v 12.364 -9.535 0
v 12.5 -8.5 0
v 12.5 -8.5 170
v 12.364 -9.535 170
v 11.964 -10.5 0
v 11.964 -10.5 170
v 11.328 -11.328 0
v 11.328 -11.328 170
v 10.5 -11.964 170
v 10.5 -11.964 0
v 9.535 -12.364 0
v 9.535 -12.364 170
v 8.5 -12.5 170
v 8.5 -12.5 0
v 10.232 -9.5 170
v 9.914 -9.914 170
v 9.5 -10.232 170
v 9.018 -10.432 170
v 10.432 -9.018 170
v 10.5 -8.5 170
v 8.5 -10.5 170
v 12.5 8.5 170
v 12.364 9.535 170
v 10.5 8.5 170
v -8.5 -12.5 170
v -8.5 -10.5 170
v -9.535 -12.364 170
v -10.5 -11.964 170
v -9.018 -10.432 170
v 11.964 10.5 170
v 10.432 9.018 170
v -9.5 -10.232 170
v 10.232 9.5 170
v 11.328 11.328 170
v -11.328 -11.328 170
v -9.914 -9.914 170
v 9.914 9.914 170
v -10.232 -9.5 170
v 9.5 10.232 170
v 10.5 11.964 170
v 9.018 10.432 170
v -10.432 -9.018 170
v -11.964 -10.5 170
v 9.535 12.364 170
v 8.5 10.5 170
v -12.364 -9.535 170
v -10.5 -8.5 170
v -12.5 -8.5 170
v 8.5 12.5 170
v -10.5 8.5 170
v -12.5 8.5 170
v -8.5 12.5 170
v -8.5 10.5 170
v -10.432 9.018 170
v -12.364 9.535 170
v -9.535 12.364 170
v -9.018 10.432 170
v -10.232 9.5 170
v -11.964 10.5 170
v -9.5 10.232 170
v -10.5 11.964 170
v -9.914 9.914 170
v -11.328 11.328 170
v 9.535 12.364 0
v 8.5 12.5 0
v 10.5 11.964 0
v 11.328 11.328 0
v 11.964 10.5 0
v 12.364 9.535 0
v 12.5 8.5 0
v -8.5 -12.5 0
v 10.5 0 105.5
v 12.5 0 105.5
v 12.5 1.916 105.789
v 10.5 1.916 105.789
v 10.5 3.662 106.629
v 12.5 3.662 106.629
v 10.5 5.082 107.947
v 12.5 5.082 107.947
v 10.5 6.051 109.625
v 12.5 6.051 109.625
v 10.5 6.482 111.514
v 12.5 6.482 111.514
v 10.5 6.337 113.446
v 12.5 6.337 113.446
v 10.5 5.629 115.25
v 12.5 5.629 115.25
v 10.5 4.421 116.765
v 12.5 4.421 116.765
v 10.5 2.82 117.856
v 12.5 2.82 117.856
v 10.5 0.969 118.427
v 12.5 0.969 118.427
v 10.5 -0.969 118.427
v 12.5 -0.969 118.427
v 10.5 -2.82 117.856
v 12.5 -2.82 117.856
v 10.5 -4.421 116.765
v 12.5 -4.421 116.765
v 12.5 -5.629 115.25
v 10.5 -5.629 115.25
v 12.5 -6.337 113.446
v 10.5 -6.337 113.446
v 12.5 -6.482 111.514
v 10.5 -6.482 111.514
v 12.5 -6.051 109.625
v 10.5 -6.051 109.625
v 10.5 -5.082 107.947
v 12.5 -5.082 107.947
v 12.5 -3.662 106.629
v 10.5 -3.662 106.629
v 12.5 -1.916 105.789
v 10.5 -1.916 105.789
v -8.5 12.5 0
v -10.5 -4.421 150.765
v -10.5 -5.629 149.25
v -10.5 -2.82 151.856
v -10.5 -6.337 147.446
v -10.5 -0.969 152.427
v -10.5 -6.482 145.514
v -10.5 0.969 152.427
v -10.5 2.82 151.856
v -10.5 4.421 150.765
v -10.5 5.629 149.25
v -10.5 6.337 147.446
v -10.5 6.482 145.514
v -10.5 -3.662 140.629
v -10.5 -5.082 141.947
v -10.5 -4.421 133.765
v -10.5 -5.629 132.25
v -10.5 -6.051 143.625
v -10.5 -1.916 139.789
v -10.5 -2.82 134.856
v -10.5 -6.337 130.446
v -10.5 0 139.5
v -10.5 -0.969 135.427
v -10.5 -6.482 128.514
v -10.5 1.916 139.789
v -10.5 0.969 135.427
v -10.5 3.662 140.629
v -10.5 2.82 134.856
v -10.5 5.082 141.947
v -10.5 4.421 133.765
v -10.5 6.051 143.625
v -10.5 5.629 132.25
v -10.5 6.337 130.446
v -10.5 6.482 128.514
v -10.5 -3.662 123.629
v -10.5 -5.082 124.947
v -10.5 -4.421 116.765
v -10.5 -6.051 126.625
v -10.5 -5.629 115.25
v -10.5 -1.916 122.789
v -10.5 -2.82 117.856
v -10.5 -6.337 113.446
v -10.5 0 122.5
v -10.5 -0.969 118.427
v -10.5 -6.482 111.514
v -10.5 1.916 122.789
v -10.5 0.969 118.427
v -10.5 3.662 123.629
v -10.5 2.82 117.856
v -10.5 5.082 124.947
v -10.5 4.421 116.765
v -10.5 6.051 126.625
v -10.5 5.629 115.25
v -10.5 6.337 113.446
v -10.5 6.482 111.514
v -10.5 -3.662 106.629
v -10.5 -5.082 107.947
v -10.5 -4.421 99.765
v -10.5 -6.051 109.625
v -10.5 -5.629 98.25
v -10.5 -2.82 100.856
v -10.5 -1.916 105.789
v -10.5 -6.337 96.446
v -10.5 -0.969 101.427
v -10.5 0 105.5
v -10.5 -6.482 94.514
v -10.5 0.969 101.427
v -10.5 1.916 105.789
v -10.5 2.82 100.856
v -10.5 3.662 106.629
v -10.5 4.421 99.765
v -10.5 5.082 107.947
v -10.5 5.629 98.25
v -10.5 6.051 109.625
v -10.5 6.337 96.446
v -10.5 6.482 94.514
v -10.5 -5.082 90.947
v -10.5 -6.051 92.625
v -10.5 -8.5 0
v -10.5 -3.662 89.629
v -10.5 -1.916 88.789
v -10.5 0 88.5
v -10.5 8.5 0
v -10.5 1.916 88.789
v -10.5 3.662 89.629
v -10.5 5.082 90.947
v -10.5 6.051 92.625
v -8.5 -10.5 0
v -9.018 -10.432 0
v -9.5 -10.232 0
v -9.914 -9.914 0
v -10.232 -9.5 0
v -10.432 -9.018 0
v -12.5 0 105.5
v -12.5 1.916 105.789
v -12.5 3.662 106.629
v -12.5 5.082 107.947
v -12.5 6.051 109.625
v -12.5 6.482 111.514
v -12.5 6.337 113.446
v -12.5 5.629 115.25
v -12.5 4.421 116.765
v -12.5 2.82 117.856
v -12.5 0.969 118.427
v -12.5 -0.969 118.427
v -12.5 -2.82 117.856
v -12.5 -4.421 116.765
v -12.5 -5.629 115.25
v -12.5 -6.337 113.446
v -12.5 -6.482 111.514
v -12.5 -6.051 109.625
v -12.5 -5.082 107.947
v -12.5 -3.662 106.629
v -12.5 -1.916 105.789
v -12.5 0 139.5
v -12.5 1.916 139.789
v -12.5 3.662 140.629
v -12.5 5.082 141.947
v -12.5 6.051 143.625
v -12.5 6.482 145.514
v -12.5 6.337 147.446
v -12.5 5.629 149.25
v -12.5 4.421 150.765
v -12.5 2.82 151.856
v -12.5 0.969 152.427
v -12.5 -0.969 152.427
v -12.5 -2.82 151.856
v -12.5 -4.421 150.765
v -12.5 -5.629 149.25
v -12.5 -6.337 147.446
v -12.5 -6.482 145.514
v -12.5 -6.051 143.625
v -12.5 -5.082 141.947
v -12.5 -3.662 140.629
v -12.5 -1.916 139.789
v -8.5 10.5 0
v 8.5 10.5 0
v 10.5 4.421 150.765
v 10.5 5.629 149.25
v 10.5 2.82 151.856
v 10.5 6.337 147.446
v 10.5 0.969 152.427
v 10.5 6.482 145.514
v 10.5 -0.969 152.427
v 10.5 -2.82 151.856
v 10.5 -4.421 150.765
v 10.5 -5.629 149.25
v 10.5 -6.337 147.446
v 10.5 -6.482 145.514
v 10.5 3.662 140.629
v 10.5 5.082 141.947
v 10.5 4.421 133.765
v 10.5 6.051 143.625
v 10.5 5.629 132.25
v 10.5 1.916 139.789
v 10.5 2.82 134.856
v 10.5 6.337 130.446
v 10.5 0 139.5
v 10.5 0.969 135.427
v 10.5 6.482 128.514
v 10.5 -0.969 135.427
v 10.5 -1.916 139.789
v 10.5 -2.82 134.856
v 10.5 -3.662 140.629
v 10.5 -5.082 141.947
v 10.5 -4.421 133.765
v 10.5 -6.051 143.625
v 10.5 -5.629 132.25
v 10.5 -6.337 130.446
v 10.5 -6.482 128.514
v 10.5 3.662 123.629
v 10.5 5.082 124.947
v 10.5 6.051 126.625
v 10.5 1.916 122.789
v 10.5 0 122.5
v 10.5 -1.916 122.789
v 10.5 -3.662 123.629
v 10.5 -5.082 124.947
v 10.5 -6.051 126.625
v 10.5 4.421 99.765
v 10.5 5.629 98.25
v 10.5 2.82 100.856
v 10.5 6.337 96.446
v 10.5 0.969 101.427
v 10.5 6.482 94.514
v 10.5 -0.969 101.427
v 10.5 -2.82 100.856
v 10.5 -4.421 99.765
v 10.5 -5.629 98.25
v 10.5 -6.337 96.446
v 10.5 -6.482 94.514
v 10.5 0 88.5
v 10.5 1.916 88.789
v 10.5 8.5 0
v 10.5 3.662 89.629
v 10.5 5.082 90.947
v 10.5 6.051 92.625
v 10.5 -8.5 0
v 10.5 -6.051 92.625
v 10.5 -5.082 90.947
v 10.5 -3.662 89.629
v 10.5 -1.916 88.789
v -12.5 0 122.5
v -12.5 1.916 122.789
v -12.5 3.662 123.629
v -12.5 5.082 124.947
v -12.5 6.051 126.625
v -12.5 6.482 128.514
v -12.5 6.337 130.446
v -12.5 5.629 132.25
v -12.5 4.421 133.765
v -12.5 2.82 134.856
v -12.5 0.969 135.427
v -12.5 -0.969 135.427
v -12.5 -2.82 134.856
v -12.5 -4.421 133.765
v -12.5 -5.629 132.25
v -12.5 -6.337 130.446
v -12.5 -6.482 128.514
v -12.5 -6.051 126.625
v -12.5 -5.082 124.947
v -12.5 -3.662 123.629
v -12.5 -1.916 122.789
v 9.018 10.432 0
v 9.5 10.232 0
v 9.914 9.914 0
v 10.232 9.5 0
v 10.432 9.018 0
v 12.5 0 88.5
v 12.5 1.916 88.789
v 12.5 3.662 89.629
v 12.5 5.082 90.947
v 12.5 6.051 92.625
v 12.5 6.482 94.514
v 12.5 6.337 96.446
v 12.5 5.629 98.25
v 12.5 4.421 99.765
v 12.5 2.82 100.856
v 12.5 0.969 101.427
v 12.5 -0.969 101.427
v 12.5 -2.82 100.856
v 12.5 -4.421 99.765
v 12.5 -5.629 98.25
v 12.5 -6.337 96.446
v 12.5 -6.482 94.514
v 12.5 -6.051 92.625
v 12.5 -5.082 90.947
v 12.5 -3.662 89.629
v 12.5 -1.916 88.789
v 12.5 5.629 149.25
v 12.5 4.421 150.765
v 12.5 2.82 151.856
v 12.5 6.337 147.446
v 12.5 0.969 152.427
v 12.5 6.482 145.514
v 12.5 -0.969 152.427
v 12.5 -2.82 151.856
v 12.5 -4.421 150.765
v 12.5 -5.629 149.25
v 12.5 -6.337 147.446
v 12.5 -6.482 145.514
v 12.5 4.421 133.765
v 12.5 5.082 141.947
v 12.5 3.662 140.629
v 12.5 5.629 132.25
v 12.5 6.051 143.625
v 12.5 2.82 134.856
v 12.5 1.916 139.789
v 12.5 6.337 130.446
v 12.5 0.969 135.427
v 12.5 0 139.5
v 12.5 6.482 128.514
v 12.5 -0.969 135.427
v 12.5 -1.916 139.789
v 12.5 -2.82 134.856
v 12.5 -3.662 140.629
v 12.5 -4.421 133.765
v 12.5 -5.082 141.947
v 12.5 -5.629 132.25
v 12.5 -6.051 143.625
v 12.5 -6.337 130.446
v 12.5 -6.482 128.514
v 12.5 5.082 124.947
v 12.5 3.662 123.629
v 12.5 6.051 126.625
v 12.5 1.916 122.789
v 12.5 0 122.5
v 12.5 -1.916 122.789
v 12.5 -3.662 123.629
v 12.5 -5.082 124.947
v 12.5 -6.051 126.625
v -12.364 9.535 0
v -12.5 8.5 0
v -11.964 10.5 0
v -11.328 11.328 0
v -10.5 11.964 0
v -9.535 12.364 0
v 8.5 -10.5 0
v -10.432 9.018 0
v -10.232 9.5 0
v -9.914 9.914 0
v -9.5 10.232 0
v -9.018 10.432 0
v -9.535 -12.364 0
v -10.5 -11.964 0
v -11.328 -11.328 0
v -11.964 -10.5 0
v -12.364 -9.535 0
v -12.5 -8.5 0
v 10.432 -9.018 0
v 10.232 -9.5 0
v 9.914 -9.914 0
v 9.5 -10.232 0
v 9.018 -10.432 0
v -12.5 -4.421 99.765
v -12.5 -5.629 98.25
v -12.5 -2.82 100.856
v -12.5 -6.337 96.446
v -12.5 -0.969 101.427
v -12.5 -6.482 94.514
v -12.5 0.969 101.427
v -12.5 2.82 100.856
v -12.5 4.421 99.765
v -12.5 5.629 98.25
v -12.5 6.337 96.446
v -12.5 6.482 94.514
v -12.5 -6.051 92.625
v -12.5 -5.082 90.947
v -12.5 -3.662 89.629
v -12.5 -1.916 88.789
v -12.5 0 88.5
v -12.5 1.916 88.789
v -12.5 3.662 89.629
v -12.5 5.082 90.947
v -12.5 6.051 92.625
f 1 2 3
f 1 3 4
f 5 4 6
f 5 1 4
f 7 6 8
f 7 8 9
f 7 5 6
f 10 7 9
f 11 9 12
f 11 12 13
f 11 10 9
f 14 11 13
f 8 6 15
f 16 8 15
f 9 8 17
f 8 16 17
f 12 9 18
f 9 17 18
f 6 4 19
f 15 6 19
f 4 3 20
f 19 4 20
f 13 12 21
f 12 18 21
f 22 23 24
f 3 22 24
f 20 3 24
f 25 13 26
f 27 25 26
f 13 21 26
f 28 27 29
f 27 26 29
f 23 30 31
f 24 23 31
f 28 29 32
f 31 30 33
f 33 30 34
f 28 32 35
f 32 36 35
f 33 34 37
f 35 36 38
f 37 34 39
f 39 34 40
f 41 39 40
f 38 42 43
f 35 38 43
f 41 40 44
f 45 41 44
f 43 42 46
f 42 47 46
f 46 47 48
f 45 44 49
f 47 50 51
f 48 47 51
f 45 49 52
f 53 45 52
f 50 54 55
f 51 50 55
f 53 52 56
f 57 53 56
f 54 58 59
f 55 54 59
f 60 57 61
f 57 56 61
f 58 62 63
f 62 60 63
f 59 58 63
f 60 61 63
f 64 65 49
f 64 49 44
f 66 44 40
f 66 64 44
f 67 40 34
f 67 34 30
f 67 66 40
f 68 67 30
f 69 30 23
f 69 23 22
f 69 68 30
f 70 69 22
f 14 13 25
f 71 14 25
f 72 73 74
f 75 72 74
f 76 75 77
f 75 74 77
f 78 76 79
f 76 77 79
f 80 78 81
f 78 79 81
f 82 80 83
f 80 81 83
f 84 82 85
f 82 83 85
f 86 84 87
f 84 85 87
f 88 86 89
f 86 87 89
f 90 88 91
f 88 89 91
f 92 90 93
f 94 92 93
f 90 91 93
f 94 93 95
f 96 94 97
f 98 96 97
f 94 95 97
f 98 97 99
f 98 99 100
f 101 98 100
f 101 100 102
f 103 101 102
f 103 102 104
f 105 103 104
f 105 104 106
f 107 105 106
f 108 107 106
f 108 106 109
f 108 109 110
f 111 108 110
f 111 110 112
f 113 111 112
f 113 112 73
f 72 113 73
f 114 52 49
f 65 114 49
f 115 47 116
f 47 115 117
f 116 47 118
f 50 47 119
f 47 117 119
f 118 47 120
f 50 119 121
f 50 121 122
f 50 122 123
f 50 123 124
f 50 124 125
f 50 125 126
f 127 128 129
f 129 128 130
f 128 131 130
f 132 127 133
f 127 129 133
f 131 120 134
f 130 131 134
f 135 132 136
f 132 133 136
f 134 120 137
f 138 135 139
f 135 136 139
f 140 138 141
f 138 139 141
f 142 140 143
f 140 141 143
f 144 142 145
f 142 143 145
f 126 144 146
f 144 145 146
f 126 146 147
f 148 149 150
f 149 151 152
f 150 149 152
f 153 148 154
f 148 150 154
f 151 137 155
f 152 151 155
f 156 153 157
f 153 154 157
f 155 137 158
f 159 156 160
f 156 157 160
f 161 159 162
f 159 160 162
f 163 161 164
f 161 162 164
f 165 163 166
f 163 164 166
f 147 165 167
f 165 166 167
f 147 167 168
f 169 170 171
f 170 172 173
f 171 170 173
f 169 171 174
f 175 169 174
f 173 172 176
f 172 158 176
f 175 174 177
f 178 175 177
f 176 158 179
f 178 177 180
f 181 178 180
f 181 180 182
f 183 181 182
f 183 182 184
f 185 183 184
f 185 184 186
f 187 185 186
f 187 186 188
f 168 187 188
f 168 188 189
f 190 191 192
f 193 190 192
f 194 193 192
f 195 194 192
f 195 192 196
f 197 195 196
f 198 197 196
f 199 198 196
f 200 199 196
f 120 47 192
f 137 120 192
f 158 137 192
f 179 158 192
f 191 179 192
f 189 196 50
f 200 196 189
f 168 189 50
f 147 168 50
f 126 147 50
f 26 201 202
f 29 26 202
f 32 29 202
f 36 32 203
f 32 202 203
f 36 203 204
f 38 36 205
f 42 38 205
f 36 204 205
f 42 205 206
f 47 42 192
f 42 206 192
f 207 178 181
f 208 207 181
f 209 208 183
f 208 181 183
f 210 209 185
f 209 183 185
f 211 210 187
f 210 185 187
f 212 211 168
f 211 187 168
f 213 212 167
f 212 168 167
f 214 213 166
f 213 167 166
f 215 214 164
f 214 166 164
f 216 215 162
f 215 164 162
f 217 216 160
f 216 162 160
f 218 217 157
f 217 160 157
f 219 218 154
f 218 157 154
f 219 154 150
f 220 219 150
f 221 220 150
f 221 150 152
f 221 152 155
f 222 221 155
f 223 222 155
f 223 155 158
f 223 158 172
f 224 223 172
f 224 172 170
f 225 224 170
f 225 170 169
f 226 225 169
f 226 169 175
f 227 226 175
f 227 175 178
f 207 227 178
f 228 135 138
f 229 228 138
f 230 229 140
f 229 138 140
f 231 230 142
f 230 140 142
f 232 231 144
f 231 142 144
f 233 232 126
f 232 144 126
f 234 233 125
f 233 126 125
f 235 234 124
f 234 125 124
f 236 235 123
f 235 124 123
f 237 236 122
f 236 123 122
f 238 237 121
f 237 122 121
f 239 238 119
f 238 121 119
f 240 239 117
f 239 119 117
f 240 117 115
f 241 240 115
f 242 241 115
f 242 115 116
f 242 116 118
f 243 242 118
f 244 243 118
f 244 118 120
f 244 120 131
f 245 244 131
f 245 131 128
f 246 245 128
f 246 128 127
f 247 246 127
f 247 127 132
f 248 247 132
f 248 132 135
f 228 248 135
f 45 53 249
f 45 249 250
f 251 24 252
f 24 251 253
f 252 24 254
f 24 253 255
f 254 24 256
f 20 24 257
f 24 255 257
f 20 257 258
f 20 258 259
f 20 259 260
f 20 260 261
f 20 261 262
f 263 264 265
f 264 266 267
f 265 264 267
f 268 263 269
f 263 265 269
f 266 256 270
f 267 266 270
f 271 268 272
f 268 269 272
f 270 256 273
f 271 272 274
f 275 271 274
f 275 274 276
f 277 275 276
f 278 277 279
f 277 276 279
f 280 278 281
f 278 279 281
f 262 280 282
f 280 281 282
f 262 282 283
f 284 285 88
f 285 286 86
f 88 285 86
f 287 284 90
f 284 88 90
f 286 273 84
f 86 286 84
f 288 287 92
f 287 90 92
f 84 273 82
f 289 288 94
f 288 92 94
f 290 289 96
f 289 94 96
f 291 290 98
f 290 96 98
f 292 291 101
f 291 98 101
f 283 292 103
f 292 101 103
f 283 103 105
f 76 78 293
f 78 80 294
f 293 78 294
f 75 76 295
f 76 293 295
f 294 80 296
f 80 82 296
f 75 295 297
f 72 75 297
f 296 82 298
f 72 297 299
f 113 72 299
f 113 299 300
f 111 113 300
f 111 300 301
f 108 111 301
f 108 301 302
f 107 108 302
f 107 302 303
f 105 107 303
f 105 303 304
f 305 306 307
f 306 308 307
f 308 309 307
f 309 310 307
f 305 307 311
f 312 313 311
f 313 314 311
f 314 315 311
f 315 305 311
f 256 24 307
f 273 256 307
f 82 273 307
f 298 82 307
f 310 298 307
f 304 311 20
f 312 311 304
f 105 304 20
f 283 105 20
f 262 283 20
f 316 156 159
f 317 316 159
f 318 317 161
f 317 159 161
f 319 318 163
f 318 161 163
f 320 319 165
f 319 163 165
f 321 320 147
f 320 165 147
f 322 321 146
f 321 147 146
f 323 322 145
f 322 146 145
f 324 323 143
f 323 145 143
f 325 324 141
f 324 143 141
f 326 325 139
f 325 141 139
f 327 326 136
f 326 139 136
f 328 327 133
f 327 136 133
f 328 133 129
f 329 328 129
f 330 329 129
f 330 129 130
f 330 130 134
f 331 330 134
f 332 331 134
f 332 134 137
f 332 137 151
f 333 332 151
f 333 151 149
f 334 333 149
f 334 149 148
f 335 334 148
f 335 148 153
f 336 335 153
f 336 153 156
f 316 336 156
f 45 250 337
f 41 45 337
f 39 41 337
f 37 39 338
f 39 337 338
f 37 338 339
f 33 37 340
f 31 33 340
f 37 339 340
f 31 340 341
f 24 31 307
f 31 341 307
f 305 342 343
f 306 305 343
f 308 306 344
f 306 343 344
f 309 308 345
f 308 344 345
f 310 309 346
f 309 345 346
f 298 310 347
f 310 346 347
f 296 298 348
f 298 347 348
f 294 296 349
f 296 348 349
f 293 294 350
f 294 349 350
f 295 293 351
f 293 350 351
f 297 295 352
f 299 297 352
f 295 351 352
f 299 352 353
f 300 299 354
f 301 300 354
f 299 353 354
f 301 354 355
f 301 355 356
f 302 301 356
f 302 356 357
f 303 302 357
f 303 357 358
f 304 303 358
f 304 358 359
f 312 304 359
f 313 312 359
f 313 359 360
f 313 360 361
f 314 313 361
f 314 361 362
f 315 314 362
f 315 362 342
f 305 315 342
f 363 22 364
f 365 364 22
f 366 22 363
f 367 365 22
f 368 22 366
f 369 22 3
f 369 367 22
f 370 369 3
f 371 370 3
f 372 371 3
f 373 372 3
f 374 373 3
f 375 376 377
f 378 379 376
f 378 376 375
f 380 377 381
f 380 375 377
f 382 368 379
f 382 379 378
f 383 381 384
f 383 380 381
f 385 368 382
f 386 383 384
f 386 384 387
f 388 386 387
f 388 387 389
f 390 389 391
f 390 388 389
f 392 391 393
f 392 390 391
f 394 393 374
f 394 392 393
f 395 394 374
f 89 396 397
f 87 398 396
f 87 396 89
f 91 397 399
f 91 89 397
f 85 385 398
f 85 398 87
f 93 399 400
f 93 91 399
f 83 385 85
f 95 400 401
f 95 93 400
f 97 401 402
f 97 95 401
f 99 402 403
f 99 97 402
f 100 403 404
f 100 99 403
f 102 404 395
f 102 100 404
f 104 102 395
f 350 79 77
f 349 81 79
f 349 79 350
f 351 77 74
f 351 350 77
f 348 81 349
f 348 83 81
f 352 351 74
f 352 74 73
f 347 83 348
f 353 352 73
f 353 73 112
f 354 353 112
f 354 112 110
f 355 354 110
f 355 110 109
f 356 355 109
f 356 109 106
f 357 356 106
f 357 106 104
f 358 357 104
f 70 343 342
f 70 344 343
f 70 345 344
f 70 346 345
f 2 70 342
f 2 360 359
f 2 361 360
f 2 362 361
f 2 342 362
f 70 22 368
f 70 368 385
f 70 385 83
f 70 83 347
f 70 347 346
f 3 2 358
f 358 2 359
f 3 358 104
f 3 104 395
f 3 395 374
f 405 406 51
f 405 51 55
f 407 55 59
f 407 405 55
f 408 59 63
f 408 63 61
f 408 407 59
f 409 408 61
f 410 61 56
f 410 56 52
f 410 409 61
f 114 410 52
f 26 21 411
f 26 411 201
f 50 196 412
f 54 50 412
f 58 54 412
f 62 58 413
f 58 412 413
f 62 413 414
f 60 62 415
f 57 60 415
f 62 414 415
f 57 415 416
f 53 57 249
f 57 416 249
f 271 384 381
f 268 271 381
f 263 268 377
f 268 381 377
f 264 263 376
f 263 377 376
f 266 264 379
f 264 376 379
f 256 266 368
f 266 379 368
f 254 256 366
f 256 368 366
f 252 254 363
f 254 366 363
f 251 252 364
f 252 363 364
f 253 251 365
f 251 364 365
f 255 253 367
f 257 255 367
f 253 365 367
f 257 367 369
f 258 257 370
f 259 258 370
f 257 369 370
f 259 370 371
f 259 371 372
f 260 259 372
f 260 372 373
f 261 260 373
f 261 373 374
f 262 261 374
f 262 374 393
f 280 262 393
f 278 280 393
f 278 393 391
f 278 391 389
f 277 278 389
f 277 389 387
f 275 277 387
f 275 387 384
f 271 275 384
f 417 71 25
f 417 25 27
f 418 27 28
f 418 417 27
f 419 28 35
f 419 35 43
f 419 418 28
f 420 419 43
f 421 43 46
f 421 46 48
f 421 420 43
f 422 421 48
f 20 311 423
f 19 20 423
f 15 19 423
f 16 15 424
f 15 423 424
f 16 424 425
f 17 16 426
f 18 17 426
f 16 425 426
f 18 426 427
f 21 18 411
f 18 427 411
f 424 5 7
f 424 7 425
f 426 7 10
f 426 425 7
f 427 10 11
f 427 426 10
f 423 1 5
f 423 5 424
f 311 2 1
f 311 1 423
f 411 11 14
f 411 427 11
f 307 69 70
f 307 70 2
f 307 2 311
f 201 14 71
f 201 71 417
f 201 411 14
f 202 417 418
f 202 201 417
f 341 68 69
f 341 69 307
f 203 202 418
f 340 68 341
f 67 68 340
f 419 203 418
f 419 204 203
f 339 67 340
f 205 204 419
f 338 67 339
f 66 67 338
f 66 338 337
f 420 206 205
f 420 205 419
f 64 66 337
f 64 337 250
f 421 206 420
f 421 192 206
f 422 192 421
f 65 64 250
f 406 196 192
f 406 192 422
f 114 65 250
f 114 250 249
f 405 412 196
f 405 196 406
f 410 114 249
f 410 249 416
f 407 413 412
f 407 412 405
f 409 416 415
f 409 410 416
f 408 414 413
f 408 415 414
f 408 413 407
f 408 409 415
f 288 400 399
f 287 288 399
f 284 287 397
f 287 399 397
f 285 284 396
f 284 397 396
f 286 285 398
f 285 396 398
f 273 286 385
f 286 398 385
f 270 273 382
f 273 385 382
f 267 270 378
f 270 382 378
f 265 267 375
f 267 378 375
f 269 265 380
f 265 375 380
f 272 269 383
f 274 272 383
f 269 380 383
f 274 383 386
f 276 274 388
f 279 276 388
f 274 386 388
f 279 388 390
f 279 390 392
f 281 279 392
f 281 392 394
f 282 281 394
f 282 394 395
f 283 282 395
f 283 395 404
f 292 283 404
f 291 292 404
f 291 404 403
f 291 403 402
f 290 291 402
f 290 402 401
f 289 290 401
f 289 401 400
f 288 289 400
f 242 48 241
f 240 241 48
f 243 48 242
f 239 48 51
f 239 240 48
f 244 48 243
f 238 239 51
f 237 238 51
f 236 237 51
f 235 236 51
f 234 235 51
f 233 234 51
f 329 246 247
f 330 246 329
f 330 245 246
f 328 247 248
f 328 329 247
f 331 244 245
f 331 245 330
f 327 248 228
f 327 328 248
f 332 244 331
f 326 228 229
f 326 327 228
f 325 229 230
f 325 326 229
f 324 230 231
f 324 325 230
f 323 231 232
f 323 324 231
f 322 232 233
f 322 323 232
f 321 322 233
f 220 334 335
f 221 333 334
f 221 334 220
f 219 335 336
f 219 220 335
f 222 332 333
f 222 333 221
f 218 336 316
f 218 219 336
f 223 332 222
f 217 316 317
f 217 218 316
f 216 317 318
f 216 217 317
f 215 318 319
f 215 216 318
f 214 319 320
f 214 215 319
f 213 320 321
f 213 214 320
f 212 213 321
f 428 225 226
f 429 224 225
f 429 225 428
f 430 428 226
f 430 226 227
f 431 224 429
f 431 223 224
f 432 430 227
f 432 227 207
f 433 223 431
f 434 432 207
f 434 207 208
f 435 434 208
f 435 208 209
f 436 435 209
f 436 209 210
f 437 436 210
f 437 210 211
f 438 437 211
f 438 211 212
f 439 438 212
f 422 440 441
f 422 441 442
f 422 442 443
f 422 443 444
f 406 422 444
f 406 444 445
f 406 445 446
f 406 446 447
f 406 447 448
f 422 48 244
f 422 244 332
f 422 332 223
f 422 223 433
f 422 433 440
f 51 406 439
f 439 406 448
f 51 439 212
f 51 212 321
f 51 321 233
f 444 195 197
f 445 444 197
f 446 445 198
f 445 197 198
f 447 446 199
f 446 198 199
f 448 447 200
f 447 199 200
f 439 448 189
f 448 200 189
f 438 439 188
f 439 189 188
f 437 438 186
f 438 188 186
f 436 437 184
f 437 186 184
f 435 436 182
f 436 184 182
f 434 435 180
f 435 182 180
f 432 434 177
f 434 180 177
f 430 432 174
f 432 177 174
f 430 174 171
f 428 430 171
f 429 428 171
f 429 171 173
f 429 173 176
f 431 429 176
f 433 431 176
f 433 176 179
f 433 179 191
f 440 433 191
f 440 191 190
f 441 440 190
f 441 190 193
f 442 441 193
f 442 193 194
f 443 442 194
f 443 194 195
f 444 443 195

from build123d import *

# Parameters (mm, degrees)
EXTRUDE_1_DEPTH     = 170
SKETCH_2_R          = 6.5
CUT_EXTRUDE_1_DEPTH = 173.28247154


with BuildPart() as part:
    # Эскиз1 → Бобышка-Вытянуть1 (new body)
    with BuildSketch(Plane.XY):
        with BuildLine():
            Line((8.5, -12.5), (-8.5, -12.5))
            ThreePointArc((-8.5, -12.5), (-11.328427125, -11.328427125), (-12.5, -8.5))
            Line((-12.5, -8.5), (-12.5, 8.5))
            ThreePointArc((-12.5, 8.5), (-11.328427125, 11.328427125), (-8.5, 12.5))
            Line((-8.5, 12.5), (8.5, 12.5))
            ThreePointArc((8.5, 12.5), (11.328427125, 11.328427125), (12.5, 8.5))
            Line((12.5, 8.5), (12.5, -8.5))
            ThreePointArc((12.5, -8.5), (11.328427125, -11.328427125), (8.5, -12.5))
        make_face()
        with BuildLine():
            Line((-10.5, -8.5), (-10.5, 8.5))
            ThreePointArc((-10.5, 8.5), (-9.914213562, 9.914213562), (-8.5, 10.5))
            Line((-8.5, 10.5), (8.5, 10.5))
            ThreePointArc((8.5, 10.5), (9.914213562, 9.914213562), (10.5, 8.5))
            Line((10.5, 8.5), (10.5, -8.5))
            ThreePointArc((10.5, -8.5), (9.914213562, -9.914213562), (8.5, -10.5))
            Line((8.5, -10.5), (-8.5, -10.5))
            ThreePointArc((-8.5, -10.5), (-9.914213562, -9.914213562), (-10.5, -8.5))
        make_face(mode=Mode.SUBTRACT)
    extrude(amount=EXTRUDE_1_DEPTH)

    # Эскиз2 → Вырез-Вытянуть1 (cut, through all)
    with BuildSketch(Plane(origin=(12.5, 0, 0), x_dir=(0, 0, -1), z_dir=(1, 0, 0))):
        with Locations((-146, 0)):
            Circle(SKETCH_2_R)
        with Locations((-129, 0)):
            Circle(SKETCH_2_R)
        with Locations((-112, 0)):
            Circle(SKETCH_2_R)
        with Locations((-95, 0)):
            Circle(SKETCH_2_R)
    extrude(amount=-CUT_EXTRUDE_1_DEPTH, mode=Mode.SUBTRACT)


solid = part.part
